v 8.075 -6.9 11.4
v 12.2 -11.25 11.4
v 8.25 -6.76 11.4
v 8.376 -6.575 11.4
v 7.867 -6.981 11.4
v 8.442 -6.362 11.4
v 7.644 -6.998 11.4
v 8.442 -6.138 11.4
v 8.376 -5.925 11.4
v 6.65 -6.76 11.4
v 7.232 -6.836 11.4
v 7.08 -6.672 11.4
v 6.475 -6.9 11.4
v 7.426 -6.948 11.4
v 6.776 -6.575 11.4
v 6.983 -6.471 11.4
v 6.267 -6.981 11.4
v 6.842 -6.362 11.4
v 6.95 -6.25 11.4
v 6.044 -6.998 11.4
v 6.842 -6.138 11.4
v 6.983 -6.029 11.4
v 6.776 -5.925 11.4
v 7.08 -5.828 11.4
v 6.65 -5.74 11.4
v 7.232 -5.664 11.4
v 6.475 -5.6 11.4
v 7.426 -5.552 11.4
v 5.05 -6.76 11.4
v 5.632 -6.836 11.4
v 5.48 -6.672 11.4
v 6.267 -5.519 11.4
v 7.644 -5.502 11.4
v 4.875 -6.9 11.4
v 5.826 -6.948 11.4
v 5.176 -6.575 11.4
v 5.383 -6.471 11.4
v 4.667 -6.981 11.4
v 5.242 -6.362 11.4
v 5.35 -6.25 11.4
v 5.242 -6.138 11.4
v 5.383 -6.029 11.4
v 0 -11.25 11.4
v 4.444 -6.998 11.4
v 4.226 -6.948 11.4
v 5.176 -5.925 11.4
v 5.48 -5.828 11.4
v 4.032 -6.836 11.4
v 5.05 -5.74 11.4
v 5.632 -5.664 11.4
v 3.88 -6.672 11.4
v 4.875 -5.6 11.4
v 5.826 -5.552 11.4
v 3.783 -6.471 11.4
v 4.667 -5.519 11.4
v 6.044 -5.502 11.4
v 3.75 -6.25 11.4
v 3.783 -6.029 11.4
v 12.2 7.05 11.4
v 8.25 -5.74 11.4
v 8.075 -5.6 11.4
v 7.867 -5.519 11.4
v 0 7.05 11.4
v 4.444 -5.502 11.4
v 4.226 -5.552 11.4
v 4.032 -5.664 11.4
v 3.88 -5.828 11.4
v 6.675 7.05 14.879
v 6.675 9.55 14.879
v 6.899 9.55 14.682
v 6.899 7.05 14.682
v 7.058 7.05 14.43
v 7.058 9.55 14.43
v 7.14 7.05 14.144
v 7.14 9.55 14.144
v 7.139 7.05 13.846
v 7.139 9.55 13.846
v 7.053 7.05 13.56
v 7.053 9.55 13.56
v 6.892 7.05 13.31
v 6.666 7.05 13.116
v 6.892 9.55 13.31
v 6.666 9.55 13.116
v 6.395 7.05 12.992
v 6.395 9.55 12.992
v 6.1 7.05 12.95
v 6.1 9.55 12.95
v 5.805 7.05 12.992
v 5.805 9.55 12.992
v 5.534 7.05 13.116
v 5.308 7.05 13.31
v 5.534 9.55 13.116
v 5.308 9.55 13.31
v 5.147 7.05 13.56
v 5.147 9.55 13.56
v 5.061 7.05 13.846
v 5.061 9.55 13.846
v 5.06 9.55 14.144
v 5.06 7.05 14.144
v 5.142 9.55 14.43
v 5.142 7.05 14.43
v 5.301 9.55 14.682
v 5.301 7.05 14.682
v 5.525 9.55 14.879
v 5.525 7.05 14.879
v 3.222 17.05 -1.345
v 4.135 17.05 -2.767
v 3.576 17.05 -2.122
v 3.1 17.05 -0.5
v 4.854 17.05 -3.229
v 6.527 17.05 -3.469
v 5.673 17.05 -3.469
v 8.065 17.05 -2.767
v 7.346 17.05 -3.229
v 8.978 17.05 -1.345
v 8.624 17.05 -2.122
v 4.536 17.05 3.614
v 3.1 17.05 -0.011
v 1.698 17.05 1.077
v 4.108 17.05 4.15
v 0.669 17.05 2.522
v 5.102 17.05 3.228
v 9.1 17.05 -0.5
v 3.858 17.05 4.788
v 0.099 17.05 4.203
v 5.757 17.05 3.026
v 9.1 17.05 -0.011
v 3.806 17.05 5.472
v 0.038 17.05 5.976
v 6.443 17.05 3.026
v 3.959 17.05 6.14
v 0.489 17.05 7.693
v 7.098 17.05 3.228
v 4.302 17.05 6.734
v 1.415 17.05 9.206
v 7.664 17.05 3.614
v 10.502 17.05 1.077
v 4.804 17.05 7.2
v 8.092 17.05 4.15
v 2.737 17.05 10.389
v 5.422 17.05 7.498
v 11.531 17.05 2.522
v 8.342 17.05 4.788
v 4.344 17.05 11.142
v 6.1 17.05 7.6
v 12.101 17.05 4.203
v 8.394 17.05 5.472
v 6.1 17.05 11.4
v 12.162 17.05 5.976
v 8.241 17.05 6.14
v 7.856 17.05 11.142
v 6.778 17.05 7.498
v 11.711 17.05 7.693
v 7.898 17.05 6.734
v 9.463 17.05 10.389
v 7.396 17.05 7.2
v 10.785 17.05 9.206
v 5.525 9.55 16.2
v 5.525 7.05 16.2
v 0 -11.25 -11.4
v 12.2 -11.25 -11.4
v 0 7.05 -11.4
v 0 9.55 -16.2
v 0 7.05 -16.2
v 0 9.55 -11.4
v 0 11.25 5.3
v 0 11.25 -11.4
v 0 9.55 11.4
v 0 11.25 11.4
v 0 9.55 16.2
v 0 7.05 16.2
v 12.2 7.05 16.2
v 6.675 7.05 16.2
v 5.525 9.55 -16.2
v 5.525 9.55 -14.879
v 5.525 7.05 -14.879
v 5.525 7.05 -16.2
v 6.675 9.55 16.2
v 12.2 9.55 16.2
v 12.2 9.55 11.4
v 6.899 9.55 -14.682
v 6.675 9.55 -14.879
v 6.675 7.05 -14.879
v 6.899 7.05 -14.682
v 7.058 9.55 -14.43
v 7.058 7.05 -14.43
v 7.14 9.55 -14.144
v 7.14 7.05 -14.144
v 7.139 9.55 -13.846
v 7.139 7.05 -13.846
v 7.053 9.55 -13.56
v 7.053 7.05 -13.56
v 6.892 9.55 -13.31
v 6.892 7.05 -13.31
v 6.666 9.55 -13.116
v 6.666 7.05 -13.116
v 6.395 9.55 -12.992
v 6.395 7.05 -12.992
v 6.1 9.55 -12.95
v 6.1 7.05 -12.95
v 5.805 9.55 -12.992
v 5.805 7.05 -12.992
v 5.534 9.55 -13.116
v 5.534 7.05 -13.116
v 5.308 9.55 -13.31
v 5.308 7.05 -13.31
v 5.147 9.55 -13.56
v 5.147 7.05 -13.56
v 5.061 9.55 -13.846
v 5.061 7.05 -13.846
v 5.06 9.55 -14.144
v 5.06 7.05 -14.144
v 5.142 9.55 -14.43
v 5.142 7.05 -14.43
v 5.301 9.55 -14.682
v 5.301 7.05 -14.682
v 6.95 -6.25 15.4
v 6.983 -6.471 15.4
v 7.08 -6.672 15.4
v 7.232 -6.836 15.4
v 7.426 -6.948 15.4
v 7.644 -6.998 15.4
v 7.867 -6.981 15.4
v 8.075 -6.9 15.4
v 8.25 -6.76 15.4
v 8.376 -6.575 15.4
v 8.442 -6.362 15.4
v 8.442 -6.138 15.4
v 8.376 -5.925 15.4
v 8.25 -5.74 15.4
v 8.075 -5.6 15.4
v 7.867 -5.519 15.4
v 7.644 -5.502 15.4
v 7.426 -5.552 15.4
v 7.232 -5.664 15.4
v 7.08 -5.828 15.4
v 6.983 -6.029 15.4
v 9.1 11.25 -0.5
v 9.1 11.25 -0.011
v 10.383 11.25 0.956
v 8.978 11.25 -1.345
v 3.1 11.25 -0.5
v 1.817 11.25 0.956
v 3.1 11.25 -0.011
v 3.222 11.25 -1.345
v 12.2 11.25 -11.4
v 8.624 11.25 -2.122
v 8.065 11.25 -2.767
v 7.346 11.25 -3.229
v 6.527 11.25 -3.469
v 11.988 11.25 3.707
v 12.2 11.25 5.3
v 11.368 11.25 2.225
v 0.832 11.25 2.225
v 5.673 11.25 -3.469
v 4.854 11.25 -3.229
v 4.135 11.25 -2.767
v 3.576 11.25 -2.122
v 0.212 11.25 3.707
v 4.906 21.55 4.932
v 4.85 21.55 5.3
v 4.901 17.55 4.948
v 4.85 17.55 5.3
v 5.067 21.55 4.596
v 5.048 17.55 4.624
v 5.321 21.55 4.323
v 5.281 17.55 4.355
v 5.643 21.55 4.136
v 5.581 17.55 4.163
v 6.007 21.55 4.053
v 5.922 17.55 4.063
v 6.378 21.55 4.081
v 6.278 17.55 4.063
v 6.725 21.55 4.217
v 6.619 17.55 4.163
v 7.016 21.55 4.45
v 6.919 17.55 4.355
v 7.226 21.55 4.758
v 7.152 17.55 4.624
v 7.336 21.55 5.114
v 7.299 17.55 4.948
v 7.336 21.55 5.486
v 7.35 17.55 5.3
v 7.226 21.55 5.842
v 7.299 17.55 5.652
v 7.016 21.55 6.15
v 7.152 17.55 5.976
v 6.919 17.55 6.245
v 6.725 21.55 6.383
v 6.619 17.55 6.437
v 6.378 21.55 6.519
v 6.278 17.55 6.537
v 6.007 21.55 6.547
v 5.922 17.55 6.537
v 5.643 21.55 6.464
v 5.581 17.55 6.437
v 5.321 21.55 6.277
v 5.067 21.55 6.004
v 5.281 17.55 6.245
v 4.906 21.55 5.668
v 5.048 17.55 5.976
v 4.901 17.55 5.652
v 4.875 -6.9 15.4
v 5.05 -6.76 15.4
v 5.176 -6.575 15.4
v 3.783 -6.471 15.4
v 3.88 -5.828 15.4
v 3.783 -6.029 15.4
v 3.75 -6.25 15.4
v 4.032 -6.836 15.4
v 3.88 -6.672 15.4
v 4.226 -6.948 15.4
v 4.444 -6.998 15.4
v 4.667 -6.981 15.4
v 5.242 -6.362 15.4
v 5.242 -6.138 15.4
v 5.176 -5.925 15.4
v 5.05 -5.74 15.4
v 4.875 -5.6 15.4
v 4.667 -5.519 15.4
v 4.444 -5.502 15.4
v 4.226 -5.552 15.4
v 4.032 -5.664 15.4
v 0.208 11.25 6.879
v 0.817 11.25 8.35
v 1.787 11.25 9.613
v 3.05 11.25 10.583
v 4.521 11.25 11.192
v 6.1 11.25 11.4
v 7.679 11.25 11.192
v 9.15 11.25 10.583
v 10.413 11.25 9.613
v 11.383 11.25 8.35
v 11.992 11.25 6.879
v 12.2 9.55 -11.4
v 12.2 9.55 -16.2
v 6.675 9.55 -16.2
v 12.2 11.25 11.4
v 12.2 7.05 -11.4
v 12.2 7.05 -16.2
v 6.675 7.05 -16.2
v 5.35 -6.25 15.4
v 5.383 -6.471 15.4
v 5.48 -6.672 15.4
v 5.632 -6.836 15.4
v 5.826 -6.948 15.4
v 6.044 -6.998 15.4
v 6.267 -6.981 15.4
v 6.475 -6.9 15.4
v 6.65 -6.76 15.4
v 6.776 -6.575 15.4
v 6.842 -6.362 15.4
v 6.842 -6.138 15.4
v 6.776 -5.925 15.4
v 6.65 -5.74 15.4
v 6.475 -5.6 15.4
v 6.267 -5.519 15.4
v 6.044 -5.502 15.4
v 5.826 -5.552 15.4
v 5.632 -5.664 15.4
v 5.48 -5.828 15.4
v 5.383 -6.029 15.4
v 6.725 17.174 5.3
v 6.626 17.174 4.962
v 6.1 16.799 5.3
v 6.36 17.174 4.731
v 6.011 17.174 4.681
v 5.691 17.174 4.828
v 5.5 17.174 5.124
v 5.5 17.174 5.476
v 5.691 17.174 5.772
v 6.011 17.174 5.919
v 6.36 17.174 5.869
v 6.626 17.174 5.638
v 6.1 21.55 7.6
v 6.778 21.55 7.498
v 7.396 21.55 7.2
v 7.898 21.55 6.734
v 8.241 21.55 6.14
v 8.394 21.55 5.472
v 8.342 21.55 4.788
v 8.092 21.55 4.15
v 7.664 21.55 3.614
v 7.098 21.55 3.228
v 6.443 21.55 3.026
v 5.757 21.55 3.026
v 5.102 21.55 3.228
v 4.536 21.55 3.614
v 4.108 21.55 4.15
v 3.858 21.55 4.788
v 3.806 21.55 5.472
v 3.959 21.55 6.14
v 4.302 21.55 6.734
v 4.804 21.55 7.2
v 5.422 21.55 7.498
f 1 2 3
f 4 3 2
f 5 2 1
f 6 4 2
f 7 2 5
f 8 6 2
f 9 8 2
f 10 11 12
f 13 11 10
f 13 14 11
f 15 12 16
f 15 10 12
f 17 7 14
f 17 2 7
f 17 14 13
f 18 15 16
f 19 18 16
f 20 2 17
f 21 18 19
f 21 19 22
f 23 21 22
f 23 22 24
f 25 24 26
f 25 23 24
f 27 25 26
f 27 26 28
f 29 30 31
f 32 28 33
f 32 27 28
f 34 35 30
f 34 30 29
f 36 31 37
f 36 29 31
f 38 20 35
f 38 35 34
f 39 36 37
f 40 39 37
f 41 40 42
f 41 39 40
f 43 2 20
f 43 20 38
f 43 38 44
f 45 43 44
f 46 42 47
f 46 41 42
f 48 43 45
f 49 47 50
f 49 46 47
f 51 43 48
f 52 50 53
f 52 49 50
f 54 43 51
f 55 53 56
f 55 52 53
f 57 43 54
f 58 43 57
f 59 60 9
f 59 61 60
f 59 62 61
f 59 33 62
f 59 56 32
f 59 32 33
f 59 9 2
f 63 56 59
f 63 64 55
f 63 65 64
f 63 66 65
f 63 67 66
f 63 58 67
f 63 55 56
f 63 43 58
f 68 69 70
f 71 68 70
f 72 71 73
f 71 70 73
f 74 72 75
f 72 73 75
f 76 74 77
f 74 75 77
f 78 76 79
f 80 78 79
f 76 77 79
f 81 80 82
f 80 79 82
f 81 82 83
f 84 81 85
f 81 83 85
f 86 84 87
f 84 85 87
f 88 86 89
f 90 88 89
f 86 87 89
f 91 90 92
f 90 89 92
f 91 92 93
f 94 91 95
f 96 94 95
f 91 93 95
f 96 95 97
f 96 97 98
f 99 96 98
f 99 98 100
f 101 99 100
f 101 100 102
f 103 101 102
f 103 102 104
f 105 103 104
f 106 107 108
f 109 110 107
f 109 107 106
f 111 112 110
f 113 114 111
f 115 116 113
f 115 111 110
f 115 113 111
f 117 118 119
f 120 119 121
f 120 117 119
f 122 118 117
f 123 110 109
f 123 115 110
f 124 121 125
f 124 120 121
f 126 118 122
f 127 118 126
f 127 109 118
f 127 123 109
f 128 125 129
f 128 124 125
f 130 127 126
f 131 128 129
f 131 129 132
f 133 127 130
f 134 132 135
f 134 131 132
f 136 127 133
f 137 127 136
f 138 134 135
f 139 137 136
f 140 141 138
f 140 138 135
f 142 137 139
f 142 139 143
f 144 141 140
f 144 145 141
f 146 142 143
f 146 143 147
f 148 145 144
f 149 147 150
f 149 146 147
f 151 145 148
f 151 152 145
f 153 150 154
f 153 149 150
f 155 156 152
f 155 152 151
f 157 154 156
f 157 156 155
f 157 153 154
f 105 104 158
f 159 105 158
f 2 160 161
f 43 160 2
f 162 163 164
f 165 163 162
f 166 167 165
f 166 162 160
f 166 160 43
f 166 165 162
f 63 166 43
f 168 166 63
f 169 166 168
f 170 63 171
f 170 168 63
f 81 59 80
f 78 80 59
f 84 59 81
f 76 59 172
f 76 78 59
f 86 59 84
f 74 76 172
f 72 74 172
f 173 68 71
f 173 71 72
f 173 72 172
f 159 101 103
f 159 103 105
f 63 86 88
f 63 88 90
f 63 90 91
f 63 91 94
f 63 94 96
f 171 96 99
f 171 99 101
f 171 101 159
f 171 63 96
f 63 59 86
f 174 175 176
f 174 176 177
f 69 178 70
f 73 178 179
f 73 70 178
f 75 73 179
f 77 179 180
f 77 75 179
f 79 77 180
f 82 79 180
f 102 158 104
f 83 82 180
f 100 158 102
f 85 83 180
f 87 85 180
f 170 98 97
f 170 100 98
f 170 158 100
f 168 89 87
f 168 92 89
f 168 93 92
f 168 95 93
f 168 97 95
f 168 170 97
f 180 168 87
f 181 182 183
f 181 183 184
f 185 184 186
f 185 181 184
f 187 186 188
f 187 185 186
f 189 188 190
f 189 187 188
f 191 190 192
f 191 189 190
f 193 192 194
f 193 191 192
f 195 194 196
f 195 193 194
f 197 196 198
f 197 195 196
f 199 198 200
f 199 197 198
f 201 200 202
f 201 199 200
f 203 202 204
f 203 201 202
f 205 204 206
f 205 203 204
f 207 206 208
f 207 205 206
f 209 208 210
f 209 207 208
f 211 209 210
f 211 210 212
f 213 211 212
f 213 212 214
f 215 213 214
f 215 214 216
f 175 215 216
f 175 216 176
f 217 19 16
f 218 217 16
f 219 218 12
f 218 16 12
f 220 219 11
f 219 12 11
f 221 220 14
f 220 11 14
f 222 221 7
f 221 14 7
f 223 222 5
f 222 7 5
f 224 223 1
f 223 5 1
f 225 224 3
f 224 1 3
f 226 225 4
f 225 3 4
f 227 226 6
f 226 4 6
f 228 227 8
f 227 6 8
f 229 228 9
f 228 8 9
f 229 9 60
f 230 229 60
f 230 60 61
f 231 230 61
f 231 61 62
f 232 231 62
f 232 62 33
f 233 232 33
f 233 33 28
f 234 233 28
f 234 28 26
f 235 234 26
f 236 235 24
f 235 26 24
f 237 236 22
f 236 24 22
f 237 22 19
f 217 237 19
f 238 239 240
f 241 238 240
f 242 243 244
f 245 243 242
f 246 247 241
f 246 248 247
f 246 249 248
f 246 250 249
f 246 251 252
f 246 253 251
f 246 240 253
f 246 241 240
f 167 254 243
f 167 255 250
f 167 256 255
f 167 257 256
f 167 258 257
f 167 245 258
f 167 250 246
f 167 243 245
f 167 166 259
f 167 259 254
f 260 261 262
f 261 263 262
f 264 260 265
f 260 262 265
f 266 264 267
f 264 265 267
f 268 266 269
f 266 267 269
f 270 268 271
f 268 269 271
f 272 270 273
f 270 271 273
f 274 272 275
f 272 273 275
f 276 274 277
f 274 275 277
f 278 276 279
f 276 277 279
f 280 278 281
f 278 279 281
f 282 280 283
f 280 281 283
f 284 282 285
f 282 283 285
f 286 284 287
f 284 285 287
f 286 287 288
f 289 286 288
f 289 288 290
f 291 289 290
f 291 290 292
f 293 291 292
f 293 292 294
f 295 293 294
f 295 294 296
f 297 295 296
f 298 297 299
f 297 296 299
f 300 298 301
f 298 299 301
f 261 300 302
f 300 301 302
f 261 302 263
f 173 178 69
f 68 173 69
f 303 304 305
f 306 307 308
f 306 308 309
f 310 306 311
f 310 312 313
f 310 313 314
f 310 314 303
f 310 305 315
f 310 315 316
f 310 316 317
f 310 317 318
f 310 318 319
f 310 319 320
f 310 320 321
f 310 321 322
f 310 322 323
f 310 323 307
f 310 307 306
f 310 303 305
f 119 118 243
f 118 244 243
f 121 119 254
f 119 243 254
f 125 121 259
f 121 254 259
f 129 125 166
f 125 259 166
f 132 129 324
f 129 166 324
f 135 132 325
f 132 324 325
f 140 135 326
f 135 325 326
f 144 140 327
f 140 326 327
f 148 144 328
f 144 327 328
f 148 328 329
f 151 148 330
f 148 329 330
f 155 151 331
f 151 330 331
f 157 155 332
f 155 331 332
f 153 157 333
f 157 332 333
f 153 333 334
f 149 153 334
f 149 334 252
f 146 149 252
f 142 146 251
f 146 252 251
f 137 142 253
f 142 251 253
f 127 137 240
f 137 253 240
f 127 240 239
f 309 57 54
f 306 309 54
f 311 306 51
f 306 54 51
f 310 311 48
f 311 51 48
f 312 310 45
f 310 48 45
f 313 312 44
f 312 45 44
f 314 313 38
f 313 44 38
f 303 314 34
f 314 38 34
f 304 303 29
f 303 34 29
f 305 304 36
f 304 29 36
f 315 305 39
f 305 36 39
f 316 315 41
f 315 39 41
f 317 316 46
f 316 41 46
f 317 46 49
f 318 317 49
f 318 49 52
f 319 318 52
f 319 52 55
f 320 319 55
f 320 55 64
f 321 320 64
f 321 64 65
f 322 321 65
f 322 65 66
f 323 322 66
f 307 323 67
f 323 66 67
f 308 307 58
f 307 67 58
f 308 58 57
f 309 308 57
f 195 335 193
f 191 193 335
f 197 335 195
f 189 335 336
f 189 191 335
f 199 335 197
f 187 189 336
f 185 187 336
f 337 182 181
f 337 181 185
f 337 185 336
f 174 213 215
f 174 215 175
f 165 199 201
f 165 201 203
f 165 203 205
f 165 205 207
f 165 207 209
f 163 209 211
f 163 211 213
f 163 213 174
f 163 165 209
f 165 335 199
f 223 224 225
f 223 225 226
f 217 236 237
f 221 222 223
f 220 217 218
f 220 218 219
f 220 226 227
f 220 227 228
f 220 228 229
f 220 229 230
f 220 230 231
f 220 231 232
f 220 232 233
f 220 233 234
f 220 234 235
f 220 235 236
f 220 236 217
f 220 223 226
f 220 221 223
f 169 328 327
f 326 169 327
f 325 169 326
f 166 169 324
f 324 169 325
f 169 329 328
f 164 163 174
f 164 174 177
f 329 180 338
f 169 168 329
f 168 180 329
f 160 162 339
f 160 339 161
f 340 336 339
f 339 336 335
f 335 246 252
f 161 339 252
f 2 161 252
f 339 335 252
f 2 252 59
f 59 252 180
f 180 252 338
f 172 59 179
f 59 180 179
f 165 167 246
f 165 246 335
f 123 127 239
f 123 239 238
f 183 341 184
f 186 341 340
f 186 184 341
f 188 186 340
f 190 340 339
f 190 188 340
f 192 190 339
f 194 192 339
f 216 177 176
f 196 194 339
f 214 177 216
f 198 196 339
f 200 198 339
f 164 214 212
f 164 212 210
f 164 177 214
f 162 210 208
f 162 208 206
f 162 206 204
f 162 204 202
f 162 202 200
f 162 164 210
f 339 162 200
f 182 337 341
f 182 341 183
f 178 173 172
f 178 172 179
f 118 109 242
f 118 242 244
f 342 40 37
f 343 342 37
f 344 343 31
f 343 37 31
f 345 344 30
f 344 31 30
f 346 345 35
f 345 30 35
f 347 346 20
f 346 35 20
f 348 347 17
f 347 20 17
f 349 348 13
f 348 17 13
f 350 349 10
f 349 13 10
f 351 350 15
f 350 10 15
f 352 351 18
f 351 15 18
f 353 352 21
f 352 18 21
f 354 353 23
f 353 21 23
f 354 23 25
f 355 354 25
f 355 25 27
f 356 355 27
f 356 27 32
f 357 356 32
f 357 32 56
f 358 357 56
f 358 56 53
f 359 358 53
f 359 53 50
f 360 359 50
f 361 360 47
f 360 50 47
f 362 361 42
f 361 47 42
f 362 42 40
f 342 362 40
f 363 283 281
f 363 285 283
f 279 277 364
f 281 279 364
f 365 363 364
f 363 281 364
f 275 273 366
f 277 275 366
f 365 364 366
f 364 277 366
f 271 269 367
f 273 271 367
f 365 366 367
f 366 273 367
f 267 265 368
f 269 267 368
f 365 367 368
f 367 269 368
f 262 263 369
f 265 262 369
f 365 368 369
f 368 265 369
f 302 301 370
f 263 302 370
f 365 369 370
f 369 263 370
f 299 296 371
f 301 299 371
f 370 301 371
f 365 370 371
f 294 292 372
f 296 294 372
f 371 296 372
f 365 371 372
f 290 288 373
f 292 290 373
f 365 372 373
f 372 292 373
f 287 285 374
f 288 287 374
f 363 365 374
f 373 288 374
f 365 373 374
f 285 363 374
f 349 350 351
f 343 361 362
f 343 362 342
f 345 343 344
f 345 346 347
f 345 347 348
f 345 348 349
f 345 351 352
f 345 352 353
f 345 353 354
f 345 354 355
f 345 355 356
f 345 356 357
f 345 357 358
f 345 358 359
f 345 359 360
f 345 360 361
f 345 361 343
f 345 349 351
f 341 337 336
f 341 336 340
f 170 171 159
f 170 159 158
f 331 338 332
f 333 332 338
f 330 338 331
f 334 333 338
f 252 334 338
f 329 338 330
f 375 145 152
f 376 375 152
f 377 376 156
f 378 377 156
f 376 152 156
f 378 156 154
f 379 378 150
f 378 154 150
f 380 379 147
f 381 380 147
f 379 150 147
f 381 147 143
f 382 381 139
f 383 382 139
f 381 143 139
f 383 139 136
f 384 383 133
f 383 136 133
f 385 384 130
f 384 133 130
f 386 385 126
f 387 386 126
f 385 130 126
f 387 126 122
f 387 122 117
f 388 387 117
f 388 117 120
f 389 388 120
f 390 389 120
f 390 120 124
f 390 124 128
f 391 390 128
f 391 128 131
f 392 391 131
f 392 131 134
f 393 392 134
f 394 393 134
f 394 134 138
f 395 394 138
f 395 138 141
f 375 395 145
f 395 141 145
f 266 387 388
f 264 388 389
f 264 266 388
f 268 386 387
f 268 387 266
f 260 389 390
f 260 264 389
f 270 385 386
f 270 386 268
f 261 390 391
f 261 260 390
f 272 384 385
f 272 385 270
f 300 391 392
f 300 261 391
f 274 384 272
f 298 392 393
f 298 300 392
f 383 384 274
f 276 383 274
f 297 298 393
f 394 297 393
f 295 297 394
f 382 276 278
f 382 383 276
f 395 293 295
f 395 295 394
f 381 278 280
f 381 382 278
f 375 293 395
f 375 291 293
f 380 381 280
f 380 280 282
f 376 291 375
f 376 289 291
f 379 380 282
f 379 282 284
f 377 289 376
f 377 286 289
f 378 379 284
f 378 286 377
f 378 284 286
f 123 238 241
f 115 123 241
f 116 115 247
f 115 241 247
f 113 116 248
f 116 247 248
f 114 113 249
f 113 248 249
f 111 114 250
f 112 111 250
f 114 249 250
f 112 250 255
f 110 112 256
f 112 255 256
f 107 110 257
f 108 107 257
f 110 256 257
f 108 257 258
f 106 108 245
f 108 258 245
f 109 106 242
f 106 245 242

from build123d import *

# Parameters (mm, degrees)
BOSS_EXTRUDE1_DEPTH                 = 12.2
SKETCH2_R                           = 6.1
BOSS_EXTRUDE2_DEPTH                 = 5.8
BOSS_EXTRU_1_DEPTH                  = 5.8
ENL_V_MAT_EXTRU_1_DEPTH             = 30.050301203
SKETCH8_R                           = 0.75
BOSS_EXTRUDE5_DEPTH                 = 4
SKETCH3_R                           = 2.3
BOSS_EXTRUDE6_DEPTH                 = 4.5
DIAM_TRE_DU_PER_AGE_2_5_2_5_1_D     = 2.5
DIAM_TRE_DU_PER_AGE_2_5_2_5_1_DEPTH = 4
DIAM_TRE_DU_PER_AGE_2_5_2_5_1_TIP   = 0.751075774


with BuildPart() as part:
    # Sketch1 → Boss-Extrude1 (new body)
    with BuildSketch(Plane(origin=(0, 0, 0), x_dir=(0, 0, -1), z_dir=(1, 0, 0))):
        Polygon((-11.4, -11.25), (-11.4, 7.05), (-16.2, 7.05), (-16.2, 9.55), (-11.4, 9.55), (-11.4, 11.25), (11.4, 11.25), (11.4, 9.55), (16.2, 9.55), (16.2, 7.05), (11.4, 7.05), (11.4, -11.25), align=None)
    extrude(amount=BOSS_EXTRUDE1_DEPTH)

    # Sketch2 → Boss-Extrude2 (add)
    with BuildSketch(Plane(origin=(0, 11.25, 0), x_dir=(1, 0, 0), z_dir=(0, 1, 0))):
        with Locations(Location((6.1, -5.3, 0), (0, 0, 270))):
            Circle(SKETCH2_R)
    extrude(amount=BOSS_EXTRUDE2_DEPTH)

    # Sketch4 → Boss.-Extru.1 (add)
    with BuildSketch(Plane(origin=(0, 11.25, 0), x_dir=(1, 0, 0), z_dir=(0, 1, 0))):
        with BuildLine():
            Line((3.1, 0.5), (3.1, 0.01130869))
            ThreePointArc((3.1, 0.01130869), (6.1, 0.8), (9.1, 0.01130869))
            Line((9.1, 0.01130869), (9.1, 0.5))
            ThreePointArc((9.1, 0.5), (6.1, 3.5), (3.1, 0.5))
        make_face()
    extrude(amount=BOSS_EXTRU_1_DEPTH)

    # Sketch6 → Enlèv. mat.-Extru.1 (cut, through all)
    with BuildSketch(Plane(origin=(0, 9.55, 0), x_dir=(1, 0, 0), z_dir=(0, 1, 0))):
        with BuildLine():
            Line((5.525, -16.2), (6.675, -16.2))
            Line((6.675, -16.2), (6.675, -14.87856417))
            ThreePointArc((6.675, -14.87856417), (6.1, -12.95), (5.525, -14.87856417))
            Line((5.525, -14.87856417), (5.525, -16.2))
        make_face()
        with BuildLine():
            Line((5.525, 14.87856417), (5.525, 16.2))
            Line((5.525, 16.2), (6.675, 16.2))
            Line((6.675, 16.2), (6.675, 14.87856417))
            ThreePointArc((6.675, 14.87856417), (6.1, 12.95), (5.525, 14.87856417))
        make_face()
    extrude(amount=-ENL_V_MAT_EXTRU_1_DEPTH, mode=Mode.SUBTRACT)

    # Sketch8 → Boss-Extrude5 (add)
    with BuildSketch(Plane.XY.offset(11.4)):
        with Locations(Location((6.1, -6.25, 0), (0, 0, 180))):
            Circle(SKETCH8_R)
        with Locations(Location((7.7, -6.25, 0), (0, 0, 180))):
            Circle(SKETCH8_R)
        with Locations(Location((4.5, -6.25, 0), (0, 0, 180))):
            Circle(SKETCH8_R)
    extrude(amount=BOSS_EXTRUDE5_DEPTH)

    # Sketch3 → Boss-Extrude6 (add)
    with BuildSketch(Plane(origin=(0, 17.05, 0), x_dir=(1, 0, 0), z_dir=(0, 1, 0))):
        with Locations(Location((6.1, -5.3, 0), (0, 0, 270))):
            Circle(SKETCH3_R)
    extrude(amount=BOSS_EXTRUDE6_DEPTH)

    # Diamètre du perçage Ø2.5 (2.5)1
    with Locations(Plane(origin=(0, 21.55, 0), x_dir=(1, 0, 0), z_dir=(0, 1, 0))):
        with Locations((6.1, -5.3)):
            Hole(DIAM_TRE_DU_PER_AGE_2_5_2_5_1_D / 2, depth=DIAM_TRE_DU_PER_AGE_2_5_2_5_1_DEPTH)
            with Locations((0, 0, -(DIAM_TRE_DU_PER_AGE_2_5_2_5_1_DEPTH + DIAM_TRE_DU_PER_AGE_2_5_2_5_1_TIP / 2))):  # 118° drill point
                Cone(0, DIAM_TRE_DU_PER_AGE_2_5_2_5_1_D / 2, DIAM_TRE_DU_PER_AGE_2_5_2_5_1_TIP, mode=Mode.SUBTRACT)


solid = part.part
